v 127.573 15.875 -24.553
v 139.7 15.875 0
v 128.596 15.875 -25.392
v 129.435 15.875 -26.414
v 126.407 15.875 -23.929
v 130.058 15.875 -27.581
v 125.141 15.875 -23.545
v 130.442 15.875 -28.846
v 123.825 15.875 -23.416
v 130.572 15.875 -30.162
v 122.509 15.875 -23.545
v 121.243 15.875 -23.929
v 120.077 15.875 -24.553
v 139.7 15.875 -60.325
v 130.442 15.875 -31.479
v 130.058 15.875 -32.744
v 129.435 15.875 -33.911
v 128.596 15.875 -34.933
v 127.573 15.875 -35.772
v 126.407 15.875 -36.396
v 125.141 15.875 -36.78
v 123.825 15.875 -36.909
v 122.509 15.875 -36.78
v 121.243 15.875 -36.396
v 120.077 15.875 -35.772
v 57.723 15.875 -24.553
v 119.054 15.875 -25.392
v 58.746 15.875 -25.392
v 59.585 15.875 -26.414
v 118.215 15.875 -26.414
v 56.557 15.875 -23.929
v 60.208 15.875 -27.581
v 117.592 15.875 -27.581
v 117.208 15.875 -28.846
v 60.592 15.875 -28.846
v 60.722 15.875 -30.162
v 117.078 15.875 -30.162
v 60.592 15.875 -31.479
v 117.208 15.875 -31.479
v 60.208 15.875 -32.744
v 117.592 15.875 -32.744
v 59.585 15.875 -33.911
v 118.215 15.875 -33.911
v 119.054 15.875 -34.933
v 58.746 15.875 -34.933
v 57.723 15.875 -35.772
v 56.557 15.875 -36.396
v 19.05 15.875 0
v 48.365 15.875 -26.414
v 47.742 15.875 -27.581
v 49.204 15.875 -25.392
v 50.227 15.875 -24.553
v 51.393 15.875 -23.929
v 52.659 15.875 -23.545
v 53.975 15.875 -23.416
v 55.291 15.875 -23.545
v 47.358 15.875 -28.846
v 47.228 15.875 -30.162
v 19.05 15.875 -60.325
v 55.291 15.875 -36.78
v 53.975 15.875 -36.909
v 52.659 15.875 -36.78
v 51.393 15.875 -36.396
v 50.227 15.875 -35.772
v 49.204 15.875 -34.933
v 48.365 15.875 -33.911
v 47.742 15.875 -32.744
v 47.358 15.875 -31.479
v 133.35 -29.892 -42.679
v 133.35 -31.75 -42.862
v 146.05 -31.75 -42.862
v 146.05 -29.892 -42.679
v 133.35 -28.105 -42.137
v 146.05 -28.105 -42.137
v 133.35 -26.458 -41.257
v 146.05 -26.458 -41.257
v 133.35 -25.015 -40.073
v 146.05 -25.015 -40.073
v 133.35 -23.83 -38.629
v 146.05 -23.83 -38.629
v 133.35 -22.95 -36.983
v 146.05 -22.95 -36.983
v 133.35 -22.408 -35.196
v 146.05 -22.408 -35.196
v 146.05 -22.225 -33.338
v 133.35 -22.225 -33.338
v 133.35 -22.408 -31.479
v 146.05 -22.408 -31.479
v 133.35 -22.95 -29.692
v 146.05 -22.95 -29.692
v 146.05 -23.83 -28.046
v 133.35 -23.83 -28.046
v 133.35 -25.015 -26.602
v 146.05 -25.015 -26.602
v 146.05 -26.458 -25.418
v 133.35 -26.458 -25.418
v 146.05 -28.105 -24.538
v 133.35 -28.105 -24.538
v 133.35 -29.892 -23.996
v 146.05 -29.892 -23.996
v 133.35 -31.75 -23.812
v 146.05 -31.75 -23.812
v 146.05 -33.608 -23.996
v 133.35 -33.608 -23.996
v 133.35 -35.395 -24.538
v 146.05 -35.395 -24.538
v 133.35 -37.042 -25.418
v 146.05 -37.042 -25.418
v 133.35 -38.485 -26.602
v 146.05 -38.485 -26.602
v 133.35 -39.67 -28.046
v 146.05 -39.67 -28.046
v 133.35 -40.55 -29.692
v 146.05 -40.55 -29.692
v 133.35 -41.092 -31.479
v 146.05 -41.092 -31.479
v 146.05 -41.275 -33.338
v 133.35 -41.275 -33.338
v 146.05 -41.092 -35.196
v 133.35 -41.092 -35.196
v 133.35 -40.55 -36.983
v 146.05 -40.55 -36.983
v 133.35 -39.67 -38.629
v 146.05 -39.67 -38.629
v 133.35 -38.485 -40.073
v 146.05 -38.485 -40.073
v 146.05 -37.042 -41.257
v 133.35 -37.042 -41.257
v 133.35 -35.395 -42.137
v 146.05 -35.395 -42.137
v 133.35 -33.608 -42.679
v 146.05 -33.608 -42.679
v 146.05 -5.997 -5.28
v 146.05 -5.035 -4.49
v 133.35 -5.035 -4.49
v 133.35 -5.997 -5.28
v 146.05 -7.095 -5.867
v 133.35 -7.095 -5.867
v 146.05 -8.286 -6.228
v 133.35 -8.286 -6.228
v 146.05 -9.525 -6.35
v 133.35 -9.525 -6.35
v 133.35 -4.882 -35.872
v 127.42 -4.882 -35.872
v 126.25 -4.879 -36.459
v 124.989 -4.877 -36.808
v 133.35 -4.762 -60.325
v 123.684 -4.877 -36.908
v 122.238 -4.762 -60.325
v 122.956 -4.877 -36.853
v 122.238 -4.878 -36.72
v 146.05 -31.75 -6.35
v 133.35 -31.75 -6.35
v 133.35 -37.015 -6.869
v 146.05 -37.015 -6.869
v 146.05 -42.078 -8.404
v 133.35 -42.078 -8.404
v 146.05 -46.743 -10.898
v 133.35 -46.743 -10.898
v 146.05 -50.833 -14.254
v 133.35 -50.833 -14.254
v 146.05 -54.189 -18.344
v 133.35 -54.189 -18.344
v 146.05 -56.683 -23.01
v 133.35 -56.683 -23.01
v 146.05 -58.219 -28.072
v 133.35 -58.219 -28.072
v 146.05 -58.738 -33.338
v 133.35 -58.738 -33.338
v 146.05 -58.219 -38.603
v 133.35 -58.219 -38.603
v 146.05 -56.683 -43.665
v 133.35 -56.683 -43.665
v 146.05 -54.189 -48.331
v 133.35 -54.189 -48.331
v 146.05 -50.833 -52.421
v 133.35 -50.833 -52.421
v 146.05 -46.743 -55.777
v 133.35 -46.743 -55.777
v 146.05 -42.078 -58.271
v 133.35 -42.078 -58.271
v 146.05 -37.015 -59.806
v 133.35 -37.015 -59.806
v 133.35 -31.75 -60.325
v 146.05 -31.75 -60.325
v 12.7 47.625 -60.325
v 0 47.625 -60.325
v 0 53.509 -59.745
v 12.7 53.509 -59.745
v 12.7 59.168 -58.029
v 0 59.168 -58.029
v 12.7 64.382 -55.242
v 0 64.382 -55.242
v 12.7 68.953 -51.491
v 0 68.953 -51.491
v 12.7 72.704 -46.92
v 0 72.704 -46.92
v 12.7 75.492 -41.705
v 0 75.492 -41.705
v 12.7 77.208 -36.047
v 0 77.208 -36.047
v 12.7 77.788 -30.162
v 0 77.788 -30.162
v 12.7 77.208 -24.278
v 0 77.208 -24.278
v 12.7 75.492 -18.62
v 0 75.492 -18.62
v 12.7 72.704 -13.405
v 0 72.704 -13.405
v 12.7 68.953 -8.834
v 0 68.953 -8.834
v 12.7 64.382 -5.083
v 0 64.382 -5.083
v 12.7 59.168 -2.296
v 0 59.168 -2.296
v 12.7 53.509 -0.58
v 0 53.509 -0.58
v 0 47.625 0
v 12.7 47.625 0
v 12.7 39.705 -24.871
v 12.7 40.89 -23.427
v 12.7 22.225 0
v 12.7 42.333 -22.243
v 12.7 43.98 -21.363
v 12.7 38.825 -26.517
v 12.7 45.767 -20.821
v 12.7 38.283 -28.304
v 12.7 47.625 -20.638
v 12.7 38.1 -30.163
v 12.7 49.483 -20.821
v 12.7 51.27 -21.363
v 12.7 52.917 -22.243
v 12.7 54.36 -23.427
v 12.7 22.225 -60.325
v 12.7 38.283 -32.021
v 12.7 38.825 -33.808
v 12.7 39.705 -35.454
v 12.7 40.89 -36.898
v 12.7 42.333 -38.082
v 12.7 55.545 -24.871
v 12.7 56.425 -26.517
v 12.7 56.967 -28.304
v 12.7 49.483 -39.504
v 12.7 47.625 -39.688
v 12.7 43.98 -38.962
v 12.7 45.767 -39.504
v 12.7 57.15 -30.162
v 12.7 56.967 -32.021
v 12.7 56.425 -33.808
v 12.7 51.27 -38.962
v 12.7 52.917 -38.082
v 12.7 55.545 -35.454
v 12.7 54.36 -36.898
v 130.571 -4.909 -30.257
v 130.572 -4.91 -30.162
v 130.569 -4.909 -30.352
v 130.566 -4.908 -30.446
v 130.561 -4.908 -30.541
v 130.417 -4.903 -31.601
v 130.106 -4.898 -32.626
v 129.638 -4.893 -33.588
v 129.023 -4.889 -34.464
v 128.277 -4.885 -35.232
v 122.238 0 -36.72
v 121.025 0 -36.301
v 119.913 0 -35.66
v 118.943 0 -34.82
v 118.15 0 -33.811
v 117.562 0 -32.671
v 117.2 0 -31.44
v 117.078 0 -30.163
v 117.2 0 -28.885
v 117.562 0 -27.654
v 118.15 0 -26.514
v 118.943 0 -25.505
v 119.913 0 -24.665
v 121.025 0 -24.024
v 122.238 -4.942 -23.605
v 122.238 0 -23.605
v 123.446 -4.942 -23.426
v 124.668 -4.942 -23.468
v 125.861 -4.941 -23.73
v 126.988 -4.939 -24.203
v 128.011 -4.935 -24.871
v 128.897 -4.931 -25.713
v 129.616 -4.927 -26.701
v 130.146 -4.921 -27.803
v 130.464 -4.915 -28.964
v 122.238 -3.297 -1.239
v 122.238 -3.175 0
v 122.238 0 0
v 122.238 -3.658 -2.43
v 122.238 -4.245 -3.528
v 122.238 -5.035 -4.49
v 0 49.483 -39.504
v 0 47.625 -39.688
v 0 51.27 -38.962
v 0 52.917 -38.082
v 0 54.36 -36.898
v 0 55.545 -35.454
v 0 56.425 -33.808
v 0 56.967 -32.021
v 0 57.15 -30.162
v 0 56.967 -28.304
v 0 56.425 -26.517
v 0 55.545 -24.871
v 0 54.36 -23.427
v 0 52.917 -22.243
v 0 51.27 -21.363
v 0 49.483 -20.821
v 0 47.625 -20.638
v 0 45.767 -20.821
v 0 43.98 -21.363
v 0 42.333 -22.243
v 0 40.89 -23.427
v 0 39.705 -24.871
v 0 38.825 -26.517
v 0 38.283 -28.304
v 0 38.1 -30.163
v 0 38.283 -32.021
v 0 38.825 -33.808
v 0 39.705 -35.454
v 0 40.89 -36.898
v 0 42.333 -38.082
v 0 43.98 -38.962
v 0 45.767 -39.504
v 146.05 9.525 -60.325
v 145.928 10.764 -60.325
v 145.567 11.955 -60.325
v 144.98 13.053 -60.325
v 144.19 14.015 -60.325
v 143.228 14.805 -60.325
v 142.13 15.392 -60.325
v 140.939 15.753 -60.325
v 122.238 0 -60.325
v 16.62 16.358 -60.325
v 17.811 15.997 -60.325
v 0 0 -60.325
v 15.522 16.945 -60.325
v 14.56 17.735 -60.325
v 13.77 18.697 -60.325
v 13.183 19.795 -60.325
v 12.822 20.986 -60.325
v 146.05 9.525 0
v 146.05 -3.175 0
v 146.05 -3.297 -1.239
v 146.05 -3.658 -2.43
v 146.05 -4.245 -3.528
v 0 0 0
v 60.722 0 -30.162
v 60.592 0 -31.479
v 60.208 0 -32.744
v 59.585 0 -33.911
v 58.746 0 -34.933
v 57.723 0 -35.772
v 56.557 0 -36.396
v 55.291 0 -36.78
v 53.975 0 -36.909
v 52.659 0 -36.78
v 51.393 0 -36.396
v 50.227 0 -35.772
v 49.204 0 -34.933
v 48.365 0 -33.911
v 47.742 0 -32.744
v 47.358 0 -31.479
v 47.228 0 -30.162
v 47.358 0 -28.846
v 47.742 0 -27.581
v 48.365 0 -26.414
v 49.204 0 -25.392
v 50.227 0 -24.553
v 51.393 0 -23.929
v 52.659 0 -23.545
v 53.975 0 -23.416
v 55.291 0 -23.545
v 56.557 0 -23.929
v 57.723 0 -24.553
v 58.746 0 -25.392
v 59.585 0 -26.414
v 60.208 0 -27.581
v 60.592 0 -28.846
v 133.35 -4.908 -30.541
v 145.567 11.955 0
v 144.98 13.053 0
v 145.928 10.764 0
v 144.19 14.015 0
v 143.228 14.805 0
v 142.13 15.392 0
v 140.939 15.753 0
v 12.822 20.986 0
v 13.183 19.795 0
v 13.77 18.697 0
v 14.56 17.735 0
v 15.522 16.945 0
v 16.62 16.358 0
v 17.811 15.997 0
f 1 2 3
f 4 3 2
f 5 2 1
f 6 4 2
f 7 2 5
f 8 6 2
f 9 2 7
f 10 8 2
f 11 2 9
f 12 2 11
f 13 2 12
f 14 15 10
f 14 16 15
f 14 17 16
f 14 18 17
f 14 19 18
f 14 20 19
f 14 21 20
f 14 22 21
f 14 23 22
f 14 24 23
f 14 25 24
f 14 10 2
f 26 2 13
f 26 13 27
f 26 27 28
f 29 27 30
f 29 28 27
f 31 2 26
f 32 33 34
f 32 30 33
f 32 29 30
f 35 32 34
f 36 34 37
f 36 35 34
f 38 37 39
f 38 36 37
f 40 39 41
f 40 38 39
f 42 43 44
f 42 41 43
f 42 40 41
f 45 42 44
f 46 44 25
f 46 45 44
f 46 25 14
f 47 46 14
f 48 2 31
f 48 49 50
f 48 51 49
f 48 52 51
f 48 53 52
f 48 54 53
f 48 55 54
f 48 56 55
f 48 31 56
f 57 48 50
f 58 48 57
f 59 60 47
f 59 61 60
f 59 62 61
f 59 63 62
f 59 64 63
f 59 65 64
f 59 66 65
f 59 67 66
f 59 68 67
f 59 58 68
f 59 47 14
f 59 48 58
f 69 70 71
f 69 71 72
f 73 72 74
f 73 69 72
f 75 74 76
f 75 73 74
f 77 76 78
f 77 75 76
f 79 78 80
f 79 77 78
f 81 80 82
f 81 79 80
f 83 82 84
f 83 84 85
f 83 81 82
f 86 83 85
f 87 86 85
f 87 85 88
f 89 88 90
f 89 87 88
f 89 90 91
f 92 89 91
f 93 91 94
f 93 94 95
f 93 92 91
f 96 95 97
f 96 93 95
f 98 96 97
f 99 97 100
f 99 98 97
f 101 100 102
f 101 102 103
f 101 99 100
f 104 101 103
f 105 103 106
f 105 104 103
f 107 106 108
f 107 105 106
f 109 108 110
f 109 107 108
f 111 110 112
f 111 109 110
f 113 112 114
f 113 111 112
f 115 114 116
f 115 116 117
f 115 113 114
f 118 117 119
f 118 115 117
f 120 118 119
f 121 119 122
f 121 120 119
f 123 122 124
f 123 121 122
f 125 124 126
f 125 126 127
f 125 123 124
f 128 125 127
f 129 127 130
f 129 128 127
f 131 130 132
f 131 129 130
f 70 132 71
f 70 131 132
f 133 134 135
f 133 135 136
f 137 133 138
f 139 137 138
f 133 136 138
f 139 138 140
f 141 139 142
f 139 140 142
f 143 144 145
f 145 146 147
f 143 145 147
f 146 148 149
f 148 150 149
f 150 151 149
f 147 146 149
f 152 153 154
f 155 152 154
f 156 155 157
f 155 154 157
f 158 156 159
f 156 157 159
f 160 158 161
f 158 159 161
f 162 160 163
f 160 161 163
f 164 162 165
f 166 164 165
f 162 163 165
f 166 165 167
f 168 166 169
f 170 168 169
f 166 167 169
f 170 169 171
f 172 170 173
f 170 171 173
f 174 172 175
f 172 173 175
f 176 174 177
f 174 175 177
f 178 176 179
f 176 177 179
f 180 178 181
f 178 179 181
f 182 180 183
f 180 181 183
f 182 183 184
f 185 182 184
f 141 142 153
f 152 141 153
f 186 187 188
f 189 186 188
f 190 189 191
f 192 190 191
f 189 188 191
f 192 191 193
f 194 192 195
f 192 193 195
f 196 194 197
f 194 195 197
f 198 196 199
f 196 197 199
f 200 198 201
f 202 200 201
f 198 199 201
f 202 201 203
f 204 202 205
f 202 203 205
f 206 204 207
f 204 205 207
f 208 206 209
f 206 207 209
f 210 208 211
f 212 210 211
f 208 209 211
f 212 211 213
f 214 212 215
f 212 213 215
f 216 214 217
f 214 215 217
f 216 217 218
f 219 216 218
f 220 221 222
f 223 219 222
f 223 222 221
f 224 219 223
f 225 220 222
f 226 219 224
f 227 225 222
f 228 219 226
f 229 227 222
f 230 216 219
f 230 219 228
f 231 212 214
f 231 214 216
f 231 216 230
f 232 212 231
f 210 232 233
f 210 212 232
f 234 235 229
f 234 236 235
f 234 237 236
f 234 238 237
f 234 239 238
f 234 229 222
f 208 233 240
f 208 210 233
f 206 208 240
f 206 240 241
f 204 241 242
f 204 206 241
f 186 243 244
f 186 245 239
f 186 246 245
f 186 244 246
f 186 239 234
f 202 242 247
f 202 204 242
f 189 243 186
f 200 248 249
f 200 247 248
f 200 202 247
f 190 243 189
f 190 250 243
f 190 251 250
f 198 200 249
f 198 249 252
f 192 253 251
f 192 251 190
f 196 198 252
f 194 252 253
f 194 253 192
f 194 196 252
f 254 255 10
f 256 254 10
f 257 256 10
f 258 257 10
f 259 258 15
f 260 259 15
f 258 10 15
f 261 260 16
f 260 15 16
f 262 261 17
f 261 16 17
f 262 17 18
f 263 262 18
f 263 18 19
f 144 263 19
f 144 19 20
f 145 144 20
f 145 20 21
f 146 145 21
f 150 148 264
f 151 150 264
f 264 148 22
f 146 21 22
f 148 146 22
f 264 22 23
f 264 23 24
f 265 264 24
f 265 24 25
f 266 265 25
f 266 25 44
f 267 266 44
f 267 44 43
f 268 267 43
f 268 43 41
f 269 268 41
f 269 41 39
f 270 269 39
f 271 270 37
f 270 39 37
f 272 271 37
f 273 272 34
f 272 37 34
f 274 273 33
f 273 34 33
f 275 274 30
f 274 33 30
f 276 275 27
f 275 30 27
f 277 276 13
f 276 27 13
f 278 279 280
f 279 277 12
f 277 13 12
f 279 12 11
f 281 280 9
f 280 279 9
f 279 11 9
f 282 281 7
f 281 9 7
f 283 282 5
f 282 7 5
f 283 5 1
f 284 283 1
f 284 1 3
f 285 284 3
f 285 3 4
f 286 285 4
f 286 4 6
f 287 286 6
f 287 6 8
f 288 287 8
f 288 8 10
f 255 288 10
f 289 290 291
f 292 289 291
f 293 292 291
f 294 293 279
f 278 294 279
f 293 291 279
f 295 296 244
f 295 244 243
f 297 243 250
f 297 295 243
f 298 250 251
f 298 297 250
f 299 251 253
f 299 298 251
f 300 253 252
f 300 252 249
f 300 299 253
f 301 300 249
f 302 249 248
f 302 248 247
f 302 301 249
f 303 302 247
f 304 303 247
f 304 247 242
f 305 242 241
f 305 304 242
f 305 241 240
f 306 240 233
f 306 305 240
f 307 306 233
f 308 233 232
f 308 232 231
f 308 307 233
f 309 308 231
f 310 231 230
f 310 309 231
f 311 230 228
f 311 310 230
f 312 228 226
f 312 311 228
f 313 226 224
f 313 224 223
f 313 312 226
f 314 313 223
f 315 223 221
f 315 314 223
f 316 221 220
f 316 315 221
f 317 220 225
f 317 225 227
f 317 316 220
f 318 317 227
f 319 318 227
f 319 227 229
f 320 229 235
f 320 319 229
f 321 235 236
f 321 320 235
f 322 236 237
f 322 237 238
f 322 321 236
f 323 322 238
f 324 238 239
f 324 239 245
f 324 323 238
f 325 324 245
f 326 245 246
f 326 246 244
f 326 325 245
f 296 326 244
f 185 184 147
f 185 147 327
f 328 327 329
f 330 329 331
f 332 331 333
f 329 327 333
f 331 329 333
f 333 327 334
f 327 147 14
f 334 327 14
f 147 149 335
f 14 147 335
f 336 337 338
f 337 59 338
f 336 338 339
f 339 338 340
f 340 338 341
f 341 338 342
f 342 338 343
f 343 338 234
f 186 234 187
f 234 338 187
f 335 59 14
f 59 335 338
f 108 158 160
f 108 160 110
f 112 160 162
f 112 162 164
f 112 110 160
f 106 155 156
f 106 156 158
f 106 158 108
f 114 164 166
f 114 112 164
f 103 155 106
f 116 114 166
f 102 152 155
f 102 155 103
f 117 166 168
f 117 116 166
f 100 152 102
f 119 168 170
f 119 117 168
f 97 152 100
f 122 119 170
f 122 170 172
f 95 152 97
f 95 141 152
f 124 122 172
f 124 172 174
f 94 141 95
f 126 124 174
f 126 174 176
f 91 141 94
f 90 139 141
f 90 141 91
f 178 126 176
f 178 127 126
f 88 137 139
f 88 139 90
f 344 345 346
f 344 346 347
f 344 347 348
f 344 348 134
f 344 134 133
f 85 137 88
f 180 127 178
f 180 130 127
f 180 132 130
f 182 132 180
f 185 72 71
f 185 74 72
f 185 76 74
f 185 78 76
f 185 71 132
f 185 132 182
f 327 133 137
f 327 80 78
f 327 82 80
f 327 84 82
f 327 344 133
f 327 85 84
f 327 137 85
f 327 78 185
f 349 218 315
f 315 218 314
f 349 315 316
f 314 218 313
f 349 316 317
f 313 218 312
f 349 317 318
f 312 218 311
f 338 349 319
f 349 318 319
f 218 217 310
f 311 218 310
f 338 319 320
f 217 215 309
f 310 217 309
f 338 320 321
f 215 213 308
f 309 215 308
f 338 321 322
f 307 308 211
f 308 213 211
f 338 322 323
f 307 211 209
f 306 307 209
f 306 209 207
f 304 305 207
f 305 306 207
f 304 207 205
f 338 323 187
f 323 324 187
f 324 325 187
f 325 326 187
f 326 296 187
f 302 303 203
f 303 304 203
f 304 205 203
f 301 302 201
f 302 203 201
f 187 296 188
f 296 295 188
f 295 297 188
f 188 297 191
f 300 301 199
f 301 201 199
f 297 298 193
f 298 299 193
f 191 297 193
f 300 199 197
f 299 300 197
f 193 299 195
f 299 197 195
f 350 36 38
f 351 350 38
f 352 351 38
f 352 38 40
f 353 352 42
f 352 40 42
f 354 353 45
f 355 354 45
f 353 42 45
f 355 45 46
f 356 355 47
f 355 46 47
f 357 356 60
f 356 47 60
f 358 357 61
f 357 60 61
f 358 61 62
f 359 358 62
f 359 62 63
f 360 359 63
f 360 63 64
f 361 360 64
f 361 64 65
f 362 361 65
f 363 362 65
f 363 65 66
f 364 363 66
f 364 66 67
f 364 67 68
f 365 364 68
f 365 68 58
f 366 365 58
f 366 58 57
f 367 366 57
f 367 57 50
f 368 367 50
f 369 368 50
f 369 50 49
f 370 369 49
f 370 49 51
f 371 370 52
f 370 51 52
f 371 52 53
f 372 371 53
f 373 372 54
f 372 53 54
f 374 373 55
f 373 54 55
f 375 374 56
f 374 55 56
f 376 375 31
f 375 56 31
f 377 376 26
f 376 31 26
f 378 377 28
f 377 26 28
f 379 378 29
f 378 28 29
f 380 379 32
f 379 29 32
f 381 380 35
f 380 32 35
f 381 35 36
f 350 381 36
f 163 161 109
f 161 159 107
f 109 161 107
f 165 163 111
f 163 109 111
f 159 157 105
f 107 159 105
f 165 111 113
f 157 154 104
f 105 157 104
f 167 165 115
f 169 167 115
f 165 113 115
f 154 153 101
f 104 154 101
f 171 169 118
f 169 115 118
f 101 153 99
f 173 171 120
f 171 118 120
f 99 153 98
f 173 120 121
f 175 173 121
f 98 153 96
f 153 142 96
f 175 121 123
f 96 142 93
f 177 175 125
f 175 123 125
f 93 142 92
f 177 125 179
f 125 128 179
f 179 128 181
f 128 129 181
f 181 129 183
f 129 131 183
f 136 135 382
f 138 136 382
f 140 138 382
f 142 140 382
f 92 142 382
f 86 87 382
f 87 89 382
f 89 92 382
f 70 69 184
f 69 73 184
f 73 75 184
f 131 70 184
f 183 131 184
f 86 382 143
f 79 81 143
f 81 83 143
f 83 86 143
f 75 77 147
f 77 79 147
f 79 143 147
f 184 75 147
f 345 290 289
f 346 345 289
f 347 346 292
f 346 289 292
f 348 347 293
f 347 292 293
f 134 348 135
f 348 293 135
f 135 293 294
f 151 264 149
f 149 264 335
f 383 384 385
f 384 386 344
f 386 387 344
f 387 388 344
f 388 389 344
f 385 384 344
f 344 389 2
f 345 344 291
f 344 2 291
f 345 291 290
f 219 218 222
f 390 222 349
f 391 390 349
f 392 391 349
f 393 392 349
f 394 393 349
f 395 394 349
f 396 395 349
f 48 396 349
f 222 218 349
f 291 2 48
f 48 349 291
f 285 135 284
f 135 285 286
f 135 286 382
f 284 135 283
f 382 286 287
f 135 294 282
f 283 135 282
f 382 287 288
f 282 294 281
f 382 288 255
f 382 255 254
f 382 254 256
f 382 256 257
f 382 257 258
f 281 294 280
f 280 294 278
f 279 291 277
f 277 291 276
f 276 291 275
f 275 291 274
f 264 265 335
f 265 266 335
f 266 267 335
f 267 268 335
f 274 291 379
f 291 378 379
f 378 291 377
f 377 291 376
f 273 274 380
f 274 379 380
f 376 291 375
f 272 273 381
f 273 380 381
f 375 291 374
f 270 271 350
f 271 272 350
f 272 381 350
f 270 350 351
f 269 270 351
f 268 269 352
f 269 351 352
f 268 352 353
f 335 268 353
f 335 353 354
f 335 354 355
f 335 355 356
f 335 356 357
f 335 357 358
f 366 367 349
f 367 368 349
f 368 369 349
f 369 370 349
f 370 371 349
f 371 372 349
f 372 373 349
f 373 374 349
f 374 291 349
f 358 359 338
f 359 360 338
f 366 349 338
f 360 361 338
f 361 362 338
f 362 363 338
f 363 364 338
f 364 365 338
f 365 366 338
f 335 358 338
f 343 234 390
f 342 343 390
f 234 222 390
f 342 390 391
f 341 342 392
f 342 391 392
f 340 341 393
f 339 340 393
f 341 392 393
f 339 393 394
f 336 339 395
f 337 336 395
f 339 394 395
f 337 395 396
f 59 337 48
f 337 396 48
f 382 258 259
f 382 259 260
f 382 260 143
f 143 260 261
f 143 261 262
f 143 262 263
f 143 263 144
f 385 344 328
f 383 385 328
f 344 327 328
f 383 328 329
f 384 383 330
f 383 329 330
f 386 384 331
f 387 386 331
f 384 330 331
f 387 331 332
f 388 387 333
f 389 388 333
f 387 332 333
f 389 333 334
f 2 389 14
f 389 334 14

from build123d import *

# Parameters (mm, degrees)
SKETCH2_R           = 9.525
BOSS_EXTRUDE1_DEPTH = 12.7
SKETCH2_4_W         = 60.325
SKETCH2_4_H         = 15.875
BOSS_EXTRUDE2_DEPTH = 122.2375
BOSS_EXTRUDE4_START = 122.2375
BOSS_EXTRUDE4_DEPTH = 23.8125
BOSS_EXTRUDE5_START = 133.35
SKETCH2_9_R         = 9.525
BOSS_EXTRUDE5_DEPTH = 12.7
FILLET1_R           = 6.35
SKETCH3_R           = 6.746875
CUT_EXTRUDE1_DEPTH  = 175.747627398


with BuildPart() as part:
    # Sketch2 → Boss-Extrude1 (new body)
    with BuildSketch(Plane(origin=(0, 0, 0), x_dir=(0, 0, -1), z_dir=(1, 0, 0))):
        with BuildLine():
            Line((0, 0), (60.325, 0))
            Line((60.325, 0), (60.325, 47.625))
            ThreePointArc((60.325, 47.625), (30.1625, 77.7875), (0, 47.625))
            Line((0, 47.625), (0, 0))
        make_face()
        with Locations((30.1625, 47.625)):
            Circle(SKETCH2_R, mode=Mode.SUBTRACT)
    extrude(amount=BOSS_EXTRUDE1_DEPTH)

    # Sketch2<4> → Boss-Extrude2 (add)
    with BuildSketch(Plane(origin=(0, 0, 0), x_dir=(0, 0, -1), z_dir=(1, 0, 0))):
        with Locations((30.1625, 7.9375)):
            Rectangle(SKETCH2_4_W, SKETCH2_4_H)
    extrude(amount=BOSS_EXTRUDE2_DEPTH)

    # Sketch2<7> → Boss-Extrude4 (add)
    with BuildSketch(Plane(origin=(0, 0, 0), x_dir=(0, 0, -1), z_dir=(1, 0, 0)).offset(BOSS_EXTRUDE4_START)):
        with BuildLine():
            Line((60.325, -4.7625), (60.325, 15.875))
            Line((60.325, 15.875), (0, 15.875))
            Line((0, 15.875), (0, -3.175))
            ThreePointArc((0, -3.175), (2.430039796, -3.658364969), (4.490128061, -5.034871939))
            Line((4.490128061, -5.034871939), (60.325, -4.7625))
        make_face()
    extrude(amount=BOSS_EXTRUDE4_DEPTH)

    # Sketch2<9> → Boss-Extrude5 (add)
    with BuildSketch(Plane(origin=(0, 0, 0), x_dir=(0, 0, -1), z_dir=(1, 0, 0)).offset(BOSS_EXTRUDE5_START)):
        with BuildLine():
            ThreePointArc((4.490128061, -5.034871939), (5.866635031, -7.094960204), (6.35, -9.525))
            Line((6.35, -9.525), (6.35, -31.75))
            ThreePointArc((6.35, -31.75), (33.3375, -58.7375), (60.325, -31.75))
            Line((60.325, -31.75), (60.325, -4.7625))
            Line((60.325, -4.7625), (4.490128061, -5.034871939))
        make_face()
        with Locations((33.3375, -31.75)):
            Circle(SKETCH2_9_R, mode=Mode.SUBTRACT)
    extrude(amount=BOSS_EXTRUDE5_DEPTH)

    # Fillet1
    fillet1_edges = [part.edges().sort_by_distance(p)[0] for p in [
        (12.7, 15.875, -30.1625),
        (146.05, 15.875, -30.1625),
    ]]
    fillet(fillet1_edges, radius=FILLET1_R)

    # Sketch3 → Cut-Extrude1 (cut, through all)
    with BuildSketch(Plane(origin=(0, 15.875, 0), x_dir=(1, 0, 0), z_dir=(0, 1, 0))):
        with Locations((53.975, 30.1625)):
            Circle(SKETCH3_R)
        with Locations((123.825, 30.1625)):
            Circle(SKETCH3_R)
    extrude(amount=-CUT_EXTRUDE1_DEPTH, mode=Mode.SUBTRACT)


solid = part.part
